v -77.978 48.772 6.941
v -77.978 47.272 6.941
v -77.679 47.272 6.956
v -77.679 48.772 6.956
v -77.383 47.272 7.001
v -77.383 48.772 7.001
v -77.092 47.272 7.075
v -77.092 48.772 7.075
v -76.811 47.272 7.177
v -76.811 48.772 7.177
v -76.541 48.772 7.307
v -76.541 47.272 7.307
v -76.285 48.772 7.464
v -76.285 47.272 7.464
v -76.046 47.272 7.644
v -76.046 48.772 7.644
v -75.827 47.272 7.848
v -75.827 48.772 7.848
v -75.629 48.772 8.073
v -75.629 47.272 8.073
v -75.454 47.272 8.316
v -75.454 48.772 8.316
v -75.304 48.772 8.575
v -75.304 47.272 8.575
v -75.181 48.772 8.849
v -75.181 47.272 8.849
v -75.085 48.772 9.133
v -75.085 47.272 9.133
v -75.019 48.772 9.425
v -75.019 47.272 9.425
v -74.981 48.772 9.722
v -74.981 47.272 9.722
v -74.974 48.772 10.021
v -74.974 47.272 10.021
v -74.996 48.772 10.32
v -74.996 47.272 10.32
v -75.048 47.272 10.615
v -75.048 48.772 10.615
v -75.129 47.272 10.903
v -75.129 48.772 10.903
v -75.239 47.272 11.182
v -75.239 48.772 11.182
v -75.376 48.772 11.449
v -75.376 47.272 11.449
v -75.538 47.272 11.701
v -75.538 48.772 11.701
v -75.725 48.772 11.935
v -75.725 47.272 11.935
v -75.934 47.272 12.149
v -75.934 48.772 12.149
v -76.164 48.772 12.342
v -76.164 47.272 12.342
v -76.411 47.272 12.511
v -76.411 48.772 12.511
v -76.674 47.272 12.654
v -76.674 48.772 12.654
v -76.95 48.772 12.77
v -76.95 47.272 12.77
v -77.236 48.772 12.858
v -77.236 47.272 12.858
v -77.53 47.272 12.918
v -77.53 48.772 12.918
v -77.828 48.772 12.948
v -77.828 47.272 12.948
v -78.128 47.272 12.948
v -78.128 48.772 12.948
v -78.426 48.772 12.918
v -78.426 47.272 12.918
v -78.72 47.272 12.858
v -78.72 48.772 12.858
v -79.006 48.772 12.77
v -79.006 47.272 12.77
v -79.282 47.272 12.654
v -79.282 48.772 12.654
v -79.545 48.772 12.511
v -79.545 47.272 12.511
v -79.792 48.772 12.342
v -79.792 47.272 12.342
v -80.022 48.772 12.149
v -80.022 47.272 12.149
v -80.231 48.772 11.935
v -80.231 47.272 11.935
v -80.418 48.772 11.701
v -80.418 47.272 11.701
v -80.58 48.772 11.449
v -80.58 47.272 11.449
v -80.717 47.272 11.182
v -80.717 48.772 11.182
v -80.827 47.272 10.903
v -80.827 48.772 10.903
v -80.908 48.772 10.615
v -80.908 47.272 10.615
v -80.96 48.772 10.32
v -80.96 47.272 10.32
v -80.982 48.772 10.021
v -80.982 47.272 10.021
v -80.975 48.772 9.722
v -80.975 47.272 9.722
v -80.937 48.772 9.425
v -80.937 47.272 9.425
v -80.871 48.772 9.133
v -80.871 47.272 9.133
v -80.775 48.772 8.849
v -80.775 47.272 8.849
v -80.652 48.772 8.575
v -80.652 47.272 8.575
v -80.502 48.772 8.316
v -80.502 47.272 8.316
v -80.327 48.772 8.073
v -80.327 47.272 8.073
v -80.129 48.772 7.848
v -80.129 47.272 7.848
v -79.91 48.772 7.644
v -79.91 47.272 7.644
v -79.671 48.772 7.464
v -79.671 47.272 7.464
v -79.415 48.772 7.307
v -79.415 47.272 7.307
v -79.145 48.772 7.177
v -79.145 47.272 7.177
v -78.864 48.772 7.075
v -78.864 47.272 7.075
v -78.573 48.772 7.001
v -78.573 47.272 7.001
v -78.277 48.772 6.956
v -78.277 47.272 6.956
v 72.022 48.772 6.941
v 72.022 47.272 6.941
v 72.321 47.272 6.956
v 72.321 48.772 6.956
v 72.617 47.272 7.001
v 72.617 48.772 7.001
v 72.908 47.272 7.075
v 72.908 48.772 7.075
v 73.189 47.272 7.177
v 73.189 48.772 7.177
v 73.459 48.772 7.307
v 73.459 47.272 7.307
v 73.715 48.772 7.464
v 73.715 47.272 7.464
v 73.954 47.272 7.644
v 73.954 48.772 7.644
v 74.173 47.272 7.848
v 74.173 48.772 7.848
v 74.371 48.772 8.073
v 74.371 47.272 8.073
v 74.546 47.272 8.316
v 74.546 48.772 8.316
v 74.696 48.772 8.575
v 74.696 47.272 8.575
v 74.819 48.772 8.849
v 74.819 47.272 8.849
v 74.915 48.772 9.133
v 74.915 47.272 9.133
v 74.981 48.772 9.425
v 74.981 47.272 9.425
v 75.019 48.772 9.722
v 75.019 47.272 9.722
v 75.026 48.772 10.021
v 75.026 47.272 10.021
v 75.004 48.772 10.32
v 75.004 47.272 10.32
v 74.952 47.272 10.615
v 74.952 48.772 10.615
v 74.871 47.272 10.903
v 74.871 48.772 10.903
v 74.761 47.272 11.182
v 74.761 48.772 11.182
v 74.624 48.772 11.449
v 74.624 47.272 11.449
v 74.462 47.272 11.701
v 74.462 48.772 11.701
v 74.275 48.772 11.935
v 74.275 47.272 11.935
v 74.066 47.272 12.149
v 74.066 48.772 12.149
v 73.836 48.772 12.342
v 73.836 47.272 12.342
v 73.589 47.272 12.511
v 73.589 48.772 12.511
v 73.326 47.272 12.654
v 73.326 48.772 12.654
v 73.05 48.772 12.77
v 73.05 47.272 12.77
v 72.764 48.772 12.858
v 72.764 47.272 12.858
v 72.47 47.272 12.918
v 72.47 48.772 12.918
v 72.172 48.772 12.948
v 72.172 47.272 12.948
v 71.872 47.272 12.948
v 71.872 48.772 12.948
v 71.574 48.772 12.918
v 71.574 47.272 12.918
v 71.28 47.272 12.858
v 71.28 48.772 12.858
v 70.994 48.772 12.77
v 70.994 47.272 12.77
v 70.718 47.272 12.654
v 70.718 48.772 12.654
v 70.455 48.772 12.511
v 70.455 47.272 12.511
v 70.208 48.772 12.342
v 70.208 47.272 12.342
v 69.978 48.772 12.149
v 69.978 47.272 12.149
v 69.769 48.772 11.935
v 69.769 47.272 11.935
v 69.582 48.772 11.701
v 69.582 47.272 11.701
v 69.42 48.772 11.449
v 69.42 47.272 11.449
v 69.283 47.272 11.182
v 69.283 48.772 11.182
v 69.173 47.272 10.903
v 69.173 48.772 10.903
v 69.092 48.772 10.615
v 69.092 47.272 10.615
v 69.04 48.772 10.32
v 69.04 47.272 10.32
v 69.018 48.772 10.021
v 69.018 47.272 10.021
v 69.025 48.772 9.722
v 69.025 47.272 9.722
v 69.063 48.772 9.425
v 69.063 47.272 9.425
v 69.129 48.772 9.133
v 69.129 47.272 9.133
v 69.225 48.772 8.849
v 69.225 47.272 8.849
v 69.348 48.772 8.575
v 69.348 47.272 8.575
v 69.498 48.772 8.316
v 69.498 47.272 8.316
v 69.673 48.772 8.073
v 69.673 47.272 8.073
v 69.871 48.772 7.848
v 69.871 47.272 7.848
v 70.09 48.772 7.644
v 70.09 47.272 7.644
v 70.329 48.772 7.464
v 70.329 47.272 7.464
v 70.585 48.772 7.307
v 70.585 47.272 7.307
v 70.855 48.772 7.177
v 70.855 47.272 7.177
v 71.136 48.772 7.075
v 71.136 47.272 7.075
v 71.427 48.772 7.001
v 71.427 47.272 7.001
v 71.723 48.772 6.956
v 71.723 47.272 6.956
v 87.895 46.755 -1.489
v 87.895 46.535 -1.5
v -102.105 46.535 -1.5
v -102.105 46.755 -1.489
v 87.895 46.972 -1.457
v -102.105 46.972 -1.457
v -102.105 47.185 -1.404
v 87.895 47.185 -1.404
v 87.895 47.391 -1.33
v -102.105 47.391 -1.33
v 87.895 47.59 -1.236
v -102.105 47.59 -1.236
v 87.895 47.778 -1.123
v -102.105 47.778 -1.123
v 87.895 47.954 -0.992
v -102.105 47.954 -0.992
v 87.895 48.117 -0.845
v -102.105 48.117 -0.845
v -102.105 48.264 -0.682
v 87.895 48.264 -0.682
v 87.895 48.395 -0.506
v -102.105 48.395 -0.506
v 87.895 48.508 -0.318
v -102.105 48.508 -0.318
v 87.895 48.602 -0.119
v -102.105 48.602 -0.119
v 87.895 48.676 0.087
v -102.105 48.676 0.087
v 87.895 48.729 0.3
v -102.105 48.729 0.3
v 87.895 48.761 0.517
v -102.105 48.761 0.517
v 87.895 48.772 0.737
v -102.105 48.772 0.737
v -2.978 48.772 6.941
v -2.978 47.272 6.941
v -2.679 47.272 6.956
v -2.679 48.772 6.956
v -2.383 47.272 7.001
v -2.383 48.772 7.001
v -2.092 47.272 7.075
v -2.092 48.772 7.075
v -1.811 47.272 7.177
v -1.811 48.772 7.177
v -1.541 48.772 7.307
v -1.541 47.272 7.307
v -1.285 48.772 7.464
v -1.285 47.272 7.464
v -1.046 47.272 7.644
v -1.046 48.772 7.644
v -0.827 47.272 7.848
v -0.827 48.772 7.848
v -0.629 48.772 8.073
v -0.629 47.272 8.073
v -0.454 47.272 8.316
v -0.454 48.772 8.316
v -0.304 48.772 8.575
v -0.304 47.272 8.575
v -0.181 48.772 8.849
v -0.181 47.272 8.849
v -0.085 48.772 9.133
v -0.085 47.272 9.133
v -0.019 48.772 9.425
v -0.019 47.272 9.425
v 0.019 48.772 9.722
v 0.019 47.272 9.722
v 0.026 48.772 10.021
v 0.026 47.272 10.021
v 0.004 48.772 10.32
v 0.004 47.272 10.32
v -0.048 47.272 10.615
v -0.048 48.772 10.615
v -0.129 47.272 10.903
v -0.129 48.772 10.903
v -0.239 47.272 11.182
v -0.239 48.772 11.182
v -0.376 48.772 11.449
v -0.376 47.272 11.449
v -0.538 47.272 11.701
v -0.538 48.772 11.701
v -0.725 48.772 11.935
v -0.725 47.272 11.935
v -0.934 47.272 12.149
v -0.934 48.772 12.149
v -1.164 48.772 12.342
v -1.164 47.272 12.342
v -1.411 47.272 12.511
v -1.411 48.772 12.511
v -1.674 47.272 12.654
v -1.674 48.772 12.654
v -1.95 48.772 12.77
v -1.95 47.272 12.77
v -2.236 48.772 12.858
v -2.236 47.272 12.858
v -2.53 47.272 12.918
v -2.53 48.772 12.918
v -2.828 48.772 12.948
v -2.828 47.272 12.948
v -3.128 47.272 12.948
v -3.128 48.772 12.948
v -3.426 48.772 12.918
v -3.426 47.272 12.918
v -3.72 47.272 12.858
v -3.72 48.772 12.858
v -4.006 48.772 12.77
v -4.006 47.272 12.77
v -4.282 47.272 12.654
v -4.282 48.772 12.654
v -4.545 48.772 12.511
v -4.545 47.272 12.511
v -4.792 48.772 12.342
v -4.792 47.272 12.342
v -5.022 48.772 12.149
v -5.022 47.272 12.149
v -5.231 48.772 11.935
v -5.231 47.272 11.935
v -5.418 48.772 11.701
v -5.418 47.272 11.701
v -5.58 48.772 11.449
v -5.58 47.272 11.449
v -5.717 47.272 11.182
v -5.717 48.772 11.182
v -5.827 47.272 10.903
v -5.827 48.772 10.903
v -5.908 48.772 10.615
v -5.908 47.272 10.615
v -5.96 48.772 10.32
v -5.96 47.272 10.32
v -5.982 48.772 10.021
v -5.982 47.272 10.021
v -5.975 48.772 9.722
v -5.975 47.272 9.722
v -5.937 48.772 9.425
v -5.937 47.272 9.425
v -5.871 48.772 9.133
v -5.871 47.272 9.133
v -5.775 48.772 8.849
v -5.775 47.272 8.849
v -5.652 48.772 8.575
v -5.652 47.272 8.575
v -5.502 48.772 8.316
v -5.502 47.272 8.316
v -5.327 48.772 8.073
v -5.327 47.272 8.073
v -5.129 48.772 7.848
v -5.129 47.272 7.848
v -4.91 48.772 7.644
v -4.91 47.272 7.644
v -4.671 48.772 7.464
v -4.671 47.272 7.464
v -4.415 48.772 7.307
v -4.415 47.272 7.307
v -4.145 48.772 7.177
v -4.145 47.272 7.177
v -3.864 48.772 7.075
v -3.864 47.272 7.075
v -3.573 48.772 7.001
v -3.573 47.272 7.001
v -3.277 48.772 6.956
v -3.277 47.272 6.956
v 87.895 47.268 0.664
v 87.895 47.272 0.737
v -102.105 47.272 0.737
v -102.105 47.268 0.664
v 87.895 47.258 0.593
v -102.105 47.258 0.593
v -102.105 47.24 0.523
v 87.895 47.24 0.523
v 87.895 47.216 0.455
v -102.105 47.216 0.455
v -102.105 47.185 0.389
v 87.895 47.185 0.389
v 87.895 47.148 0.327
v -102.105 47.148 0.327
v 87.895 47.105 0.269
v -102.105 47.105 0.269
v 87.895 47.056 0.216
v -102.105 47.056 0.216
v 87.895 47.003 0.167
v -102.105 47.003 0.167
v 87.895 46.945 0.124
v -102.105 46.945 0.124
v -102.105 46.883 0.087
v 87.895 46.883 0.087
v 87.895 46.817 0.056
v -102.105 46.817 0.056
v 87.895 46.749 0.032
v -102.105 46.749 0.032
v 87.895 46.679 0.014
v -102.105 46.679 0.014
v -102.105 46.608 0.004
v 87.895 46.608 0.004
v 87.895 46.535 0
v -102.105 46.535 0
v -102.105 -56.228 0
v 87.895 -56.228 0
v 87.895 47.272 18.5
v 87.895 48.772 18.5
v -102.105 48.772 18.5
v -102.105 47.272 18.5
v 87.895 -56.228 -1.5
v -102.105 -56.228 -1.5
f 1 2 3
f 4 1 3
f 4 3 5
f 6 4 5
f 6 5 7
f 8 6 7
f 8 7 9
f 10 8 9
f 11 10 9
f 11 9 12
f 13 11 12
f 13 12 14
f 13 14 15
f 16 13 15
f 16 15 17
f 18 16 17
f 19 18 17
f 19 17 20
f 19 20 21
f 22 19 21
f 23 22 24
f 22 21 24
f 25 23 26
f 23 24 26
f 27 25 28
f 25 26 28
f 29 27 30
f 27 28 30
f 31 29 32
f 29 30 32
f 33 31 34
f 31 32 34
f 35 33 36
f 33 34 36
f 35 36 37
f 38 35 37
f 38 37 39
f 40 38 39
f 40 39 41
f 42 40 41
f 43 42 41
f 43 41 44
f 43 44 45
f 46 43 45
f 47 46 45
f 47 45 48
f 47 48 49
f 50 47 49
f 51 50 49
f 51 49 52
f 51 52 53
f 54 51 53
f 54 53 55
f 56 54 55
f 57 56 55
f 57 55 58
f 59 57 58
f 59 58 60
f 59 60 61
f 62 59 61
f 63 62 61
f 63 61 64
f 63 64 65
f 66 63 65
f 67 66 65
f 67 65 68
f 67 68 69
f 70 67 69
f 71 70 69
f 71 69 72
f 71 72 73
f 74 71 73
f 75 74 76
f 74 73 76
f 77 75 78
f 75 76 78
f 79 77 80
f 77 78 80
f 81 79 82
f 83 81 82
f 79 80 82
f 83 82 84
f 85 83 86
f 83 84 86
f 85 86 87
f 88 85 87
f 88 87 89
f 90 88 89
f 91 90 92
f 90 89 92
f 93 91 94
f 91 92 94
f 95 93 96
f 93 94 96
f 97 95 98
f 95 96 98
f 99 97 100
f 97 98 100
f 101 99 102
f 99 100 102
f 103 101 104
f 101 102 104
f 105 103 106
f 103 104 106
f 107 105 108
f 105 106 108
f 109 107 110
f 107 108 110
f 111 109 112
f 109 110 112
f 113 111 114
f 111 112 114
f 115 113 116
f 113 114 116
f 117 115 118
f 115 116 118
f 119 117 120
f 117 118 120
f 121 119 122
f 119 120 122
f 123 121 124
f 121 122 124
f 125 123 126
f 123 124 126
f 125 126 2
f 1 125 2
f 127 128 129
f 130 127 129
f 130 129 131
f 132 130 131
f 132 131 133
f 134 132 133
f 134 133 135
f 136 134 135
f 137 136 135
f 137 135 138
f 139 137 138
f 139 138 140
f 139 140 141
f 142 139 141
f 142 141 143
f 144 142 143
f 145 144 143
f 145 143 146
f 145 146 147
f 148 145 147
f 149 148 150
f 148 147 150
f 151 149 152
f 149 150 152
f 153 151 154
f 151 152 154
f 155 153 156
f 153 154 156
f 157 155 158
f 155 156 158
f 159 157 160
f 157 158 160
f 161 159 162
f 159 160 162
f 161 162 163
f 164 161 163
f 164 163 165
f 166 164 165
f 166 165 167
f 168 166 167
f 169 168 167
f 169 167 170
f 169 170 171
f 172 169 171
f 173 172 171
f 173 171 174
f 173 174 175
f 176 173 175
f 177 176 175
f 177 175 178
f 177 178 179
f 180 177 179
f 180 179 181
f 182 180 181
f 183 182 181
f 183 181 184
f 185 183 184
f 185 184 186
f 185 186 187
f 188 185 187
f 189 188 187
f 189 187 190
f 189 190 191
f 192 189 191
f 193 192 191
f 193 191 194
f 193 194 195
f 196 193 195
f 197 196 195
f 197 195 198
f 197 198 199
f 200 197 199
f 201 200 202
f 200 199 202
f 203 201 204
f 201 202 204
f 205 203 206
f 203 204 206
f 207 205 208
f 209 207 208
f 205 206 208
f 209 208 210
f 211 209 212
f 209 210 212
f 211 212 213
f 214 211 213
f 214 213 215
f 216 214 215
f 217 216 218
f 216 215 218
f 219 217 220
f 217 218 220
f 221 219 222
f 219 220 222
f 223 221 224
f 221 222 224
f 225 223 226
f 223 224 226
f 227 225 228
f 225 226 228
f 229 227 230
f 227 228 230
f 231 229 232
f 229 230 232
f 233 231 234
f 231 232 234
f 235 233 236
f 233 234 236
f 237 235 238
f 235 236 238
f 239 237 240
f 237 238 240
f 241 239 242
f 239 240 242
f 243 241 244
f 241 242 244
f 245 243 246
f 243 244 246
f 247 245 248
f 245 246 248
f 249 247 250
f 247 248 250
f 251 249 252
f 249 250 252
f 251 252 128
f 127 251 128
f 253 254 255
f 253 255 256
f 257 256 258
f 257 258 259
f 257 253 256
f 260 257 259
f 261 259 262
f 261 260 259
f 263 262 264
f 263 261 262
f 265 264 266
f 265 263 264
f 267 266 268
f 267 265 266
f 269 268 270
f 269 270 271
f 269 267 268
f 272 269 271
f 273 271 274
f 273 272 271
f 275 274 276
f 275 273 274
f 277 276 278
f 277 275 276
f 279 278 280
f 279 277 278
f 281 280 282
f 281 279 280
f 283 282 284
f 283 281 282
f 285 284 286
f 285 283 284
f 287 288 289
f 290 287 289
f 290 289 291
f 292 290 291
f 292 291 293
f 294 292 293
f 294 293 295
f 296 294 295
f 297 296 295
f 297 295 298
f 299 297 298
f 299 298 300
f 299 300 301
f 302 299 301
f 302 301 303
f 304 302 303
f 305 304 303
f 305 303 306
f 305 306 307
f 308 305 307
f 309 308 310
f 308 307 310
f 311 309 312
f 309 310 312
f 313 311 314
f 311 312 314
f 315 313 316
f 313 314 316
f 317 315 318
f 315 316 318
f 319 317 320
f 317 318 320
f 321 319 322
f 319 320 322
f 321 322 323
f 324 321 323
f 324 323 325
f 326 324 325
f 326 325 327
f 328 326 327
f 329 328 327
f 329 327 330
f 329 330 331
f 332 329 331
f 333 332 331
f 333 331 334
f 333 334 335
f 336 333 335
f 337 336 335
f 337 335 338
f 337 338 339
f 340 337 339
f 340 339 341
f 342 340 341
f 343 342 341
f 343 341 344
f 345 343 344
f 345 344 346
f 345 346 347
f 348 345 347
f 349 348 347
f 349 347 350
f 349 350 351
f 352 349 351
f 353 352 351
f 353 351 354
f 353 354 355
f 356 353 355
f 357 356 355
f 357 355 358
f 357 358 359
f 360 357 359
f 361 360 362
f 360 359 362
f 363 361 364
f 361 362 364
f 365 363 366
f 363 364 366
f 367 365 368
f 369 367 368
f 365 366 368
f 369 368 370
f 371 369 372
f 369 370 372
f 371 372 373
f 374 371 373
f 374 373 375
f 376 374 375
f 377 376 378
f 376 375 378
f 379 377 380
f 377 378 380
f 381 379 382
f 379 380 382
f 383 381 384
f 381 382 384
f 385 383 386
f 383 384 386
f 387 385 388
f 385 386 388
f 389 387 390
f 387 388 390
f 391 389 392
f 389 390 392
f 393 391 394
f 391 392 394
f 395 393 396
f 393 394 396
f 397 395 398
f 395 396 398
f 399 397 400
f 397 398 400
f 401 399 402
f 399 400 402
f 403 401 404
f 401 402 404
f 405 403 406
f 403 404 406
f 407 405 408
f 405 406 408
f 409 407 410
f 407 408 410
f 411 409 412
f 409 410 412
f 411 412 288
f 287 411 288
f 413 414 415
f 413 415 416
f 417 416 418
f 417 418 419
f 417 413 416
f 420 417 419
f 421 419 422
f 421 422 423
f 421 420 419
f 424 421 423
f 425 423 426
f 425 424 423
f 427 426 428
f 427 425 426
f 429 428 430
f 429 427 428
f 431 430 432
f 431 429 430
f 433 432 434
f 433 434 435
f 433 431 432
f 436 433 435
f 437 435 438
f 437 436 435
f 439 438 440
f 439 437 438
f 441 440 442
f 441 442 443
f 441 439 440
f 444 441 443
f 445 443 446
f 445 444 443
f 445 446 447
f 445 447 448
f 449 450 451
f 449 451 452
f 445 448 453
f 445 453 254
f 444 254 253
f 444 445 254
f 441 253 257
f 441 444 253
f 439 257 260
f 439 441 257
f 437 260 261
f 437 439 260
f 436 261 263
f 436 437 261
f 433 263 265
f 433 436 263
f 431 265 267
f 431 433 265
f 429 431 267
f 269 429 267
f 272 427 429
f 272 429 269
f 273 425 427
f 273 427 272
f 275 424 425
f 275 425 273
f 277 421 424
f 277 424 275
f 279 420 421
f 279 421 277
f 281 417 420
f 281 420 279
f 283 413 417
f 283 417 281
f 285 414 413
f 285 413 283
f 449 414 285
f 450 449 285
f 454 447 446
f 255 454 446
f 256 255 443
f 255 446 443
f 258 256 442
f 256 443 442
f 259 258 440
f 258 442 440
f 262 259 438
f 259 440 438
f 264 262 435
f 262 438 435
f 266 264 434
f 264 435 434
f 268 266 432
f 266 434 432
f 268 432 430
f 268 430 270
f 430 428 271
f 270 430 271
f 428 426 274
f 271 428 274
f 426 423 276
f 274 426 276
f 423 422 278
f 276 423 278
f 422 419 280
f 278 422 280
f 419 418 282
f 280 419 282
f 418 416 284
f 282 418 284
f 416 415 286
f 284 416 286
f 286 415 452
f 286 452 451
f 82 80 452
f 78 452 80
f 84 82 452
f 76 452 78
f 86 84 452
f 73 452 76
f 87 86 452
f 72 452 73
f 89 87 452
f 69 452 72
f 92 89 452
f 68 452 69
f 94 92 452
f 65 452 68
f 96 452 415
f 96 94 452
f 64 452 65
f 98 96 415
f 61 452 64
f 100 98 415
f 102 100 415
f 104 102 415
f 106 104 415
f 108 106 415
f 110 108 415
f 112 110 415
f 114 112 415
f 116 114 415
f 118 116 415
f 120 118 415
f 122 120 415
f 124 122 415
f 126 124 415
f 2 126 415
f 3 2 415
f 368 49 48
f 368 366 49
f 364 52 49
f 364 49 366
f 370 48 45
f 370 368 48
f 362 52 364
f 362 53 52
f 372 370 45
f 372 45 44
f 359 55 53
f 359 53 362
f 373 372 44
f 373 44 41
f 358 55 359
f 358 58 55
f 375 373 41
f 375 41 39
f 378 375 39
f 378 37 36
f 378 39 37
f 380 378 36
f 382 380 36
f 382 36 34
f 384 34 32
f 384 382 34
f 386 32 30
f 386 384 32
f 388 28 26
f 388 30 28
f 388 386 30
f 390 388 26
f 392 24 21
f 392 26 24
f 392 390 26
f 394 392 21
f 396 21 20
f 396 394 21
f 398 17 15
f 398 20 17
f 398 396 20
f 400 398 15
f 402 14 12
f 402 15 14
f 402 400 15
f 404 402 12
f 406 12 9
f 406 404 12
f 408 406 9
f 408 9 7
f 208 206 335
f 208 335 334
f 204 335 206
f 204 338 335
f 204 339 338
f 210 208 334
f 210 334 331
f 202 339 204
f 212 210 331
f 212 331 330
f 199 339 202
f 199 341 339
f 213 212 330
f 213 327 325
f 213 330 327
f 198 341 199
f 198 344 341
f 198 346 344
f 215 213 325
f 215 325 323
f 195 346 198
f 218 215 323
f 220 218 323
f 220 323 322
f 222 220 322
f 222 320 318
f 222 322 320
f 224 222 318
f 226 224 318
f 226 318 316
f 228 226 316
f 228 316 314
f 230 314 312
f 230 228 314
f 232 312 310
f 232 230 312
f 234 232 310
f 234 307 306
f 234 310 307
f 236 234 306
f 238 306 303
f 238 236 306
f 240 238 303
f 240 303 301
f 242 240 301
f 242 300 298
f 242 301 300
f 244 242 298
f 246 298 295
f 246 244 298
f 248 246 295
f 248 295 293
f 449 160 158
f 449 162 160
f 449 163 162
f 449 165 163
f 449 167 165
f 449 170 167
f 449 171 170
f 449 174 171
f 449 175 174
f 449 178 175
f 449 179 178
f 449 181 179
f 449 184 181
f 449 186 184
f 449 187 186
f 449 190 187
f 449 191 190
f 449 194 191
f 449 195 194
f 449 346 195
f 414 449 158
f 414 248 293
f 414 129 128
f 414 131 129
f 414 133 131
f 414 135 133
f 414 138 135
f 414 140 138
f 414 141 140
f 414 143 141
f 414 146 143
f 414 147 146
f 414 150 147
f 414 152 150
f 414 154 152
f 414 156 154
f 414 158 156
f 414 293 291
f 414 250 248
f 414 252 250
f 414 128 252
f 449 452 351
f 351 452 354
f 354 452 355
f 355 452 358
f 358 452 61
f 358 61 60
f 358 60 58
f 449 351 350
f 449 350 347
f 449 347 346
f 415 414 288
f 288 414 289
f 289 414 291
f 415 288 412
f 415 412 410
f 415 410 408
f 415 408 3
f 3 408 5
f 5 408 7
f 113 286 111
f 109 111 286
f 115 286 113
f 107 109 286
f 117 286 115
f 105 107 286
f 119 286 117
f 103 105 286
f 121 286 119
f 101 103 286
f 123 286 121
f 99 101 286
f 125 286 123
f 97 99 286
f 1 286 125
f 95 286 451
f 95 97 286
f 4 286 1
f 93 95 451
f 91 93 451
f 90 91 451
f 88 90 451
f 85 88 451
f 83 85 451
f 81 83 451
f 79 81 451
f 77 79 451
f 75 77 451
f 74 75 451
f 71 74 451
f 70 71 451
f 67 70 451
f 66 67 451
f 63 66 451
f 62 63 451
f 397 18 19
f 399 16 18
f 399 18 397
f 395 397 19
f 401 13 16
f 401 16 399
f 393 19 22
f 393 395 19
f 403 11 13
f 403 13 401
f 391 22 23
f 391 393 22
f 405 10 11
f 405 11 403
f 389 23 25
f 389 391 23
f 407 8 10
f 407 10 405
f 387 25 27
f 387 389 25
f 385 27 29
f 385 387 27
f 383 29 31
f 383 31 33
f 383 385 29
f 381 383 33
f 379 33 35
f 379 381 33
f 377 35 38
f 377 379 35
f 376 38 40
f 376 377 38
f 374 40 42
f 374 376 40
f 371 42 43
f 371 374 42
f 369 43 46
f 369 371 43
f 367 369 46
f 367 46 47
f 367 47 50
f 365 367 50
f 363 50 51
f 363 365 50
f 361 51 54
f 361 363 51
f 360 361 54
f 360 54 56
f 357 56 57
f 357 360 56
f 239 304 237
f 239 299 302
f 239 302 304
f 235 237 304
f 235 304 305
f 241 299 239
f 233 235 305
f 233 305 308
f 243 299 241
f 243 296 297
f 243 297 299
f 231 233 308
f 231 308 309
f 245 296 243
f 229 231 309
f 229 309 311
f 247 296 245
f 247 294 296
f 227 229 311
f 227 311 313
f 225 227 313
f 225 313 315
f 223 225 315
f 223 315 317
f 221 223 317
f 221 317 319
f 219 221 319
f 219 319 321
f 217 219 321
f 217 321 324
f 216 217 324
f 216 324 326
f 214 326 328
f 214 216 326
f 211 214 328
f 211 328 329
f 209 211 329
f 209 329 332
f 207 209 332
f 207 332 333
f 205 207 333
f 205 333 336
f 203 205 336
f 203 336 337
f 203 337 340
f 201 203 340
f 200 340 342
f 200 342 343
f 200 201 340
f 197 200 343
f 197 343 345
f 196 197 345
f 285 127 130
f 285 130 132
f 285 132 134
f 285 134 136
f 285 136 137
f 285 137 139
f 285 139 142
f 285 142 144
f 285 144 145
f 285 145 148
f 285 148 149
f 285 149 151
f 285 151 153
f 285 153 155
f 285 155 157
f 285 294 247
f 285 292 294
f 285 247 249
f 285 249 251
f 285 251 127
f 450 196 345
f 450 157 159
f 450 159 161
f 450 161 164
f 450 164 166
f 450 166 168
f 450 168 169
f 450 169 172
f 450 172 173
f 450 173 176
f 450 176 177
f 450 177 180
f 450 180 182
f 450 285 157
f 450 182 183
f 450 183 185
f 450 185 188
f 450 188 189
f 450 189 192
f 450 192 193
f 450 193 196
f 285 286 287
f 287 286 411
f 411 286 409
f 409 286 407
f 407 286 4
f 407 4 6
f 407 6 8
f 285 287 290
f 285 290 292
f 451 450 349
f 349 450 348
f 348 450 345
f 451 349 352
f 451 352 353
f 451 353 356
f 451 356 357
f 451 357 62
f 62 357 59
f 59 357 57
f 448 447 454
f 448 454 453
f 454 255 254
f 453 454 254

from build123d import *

# Parameters (mm, degrees)
SKETCH1_W                    = 190
SKETCH1_H                    = 105
BASE_FLANGE1_DEPTH           = 1.5
EDGE_FLANGE1_STRIP_W         = 7.4732
EDGE_FLANGE1_STRIP_H         = 1.5
EDGE_FLANGE1_STRIP_CUT_DEPTH = 190
EDGE_FLANGE1_DEPTH           = 190
SKETCH9_R                    = 3.004998415
CUT_EXTRUDE1_DEPTH           = 10
LPATTERN1_COUNT              = 3
LPATTERN1_PITCH              = 75


# Sheet-metal steps are written as plain solids
with BuildPart() as part:
    # Sketch1 → Base-Flange1 (new body)
    with BuildSketch(Plane.XY):
        with Locations((-7.105263158, -3.728070175)):
            Rectangle(SKETCH1_W, SKETCH1_H)
    extrude(amount=-BASE_FLANGE1_DEPTH)

    # Edge-Flange1 strip (across the edge) → Edge-Flange1 strip cut (cut)
    with BuildSketch(Plane(origin=(87.894736842, 48.771929825, 0), x_dir=(0, -1, 0), z_dir=(-1, 0, 0))):
        with Locations((-1.5, -0.75)):
            Rectangle(EDGE_FLANGE1_STRIP_W, EDGE_FLANGE1_STRIP_H)
    extrude(amount=EDGE_FLANGE1_STRIP_CUT_DEPTH, mode=Mode.SUBTRACT)

    # Edge-Flange1 section (across the edge) → Edge-Flange1 (add)
    with BuildSketch(Plane(origin=(87.894736842, 48.771929825, 0), x_dir=(0, -1, 0), z_dir=(-1, 0, 0))):
        with BuildLine():
            Line((0, 0.7366), (0, 18.5))
            Line((0, 18.5), (1.5, 18.5))
            Line((1.5, 18.5), (1.5, 0.7366))
            ThreePointArc((1.5, 0.7366), (1.715745145, 0.215745145), (2.2366, 0))
            Line((2.2366, 0), (2.2366, -1.5))
            ThreePointArc((2.2366, -1.5), (0.655084973, -0.844915027), (0, 0.7366))
        make_face()
    extrude(amount=EDGE_FLANGE1_DEPTH)

    # Sketch9 → Cut-Extrude1 (cut)
    with BuildSketch(Plane.XZ.offset(-47.271929825)):
        with Locations(Location((-77.977994627, 9.946382275, 0), (0, 0, 270))):
            Circle(SKETCH9_R)
    cut_extrude1 = extrude(amount=-CUT_EXTRUDE1_DEPTH, mode=Mode.SUBTRACT)

    # LPattern1: Cut-Extrude1 ×3
    with Locations(*[(i * LPATTERN1_PITCH, 0, 0) for i in range(1, LPATTERN1_COUNT)]):
        add(cut_extrude1, mode=Mode.SUBTRACT)


solid = part.part
